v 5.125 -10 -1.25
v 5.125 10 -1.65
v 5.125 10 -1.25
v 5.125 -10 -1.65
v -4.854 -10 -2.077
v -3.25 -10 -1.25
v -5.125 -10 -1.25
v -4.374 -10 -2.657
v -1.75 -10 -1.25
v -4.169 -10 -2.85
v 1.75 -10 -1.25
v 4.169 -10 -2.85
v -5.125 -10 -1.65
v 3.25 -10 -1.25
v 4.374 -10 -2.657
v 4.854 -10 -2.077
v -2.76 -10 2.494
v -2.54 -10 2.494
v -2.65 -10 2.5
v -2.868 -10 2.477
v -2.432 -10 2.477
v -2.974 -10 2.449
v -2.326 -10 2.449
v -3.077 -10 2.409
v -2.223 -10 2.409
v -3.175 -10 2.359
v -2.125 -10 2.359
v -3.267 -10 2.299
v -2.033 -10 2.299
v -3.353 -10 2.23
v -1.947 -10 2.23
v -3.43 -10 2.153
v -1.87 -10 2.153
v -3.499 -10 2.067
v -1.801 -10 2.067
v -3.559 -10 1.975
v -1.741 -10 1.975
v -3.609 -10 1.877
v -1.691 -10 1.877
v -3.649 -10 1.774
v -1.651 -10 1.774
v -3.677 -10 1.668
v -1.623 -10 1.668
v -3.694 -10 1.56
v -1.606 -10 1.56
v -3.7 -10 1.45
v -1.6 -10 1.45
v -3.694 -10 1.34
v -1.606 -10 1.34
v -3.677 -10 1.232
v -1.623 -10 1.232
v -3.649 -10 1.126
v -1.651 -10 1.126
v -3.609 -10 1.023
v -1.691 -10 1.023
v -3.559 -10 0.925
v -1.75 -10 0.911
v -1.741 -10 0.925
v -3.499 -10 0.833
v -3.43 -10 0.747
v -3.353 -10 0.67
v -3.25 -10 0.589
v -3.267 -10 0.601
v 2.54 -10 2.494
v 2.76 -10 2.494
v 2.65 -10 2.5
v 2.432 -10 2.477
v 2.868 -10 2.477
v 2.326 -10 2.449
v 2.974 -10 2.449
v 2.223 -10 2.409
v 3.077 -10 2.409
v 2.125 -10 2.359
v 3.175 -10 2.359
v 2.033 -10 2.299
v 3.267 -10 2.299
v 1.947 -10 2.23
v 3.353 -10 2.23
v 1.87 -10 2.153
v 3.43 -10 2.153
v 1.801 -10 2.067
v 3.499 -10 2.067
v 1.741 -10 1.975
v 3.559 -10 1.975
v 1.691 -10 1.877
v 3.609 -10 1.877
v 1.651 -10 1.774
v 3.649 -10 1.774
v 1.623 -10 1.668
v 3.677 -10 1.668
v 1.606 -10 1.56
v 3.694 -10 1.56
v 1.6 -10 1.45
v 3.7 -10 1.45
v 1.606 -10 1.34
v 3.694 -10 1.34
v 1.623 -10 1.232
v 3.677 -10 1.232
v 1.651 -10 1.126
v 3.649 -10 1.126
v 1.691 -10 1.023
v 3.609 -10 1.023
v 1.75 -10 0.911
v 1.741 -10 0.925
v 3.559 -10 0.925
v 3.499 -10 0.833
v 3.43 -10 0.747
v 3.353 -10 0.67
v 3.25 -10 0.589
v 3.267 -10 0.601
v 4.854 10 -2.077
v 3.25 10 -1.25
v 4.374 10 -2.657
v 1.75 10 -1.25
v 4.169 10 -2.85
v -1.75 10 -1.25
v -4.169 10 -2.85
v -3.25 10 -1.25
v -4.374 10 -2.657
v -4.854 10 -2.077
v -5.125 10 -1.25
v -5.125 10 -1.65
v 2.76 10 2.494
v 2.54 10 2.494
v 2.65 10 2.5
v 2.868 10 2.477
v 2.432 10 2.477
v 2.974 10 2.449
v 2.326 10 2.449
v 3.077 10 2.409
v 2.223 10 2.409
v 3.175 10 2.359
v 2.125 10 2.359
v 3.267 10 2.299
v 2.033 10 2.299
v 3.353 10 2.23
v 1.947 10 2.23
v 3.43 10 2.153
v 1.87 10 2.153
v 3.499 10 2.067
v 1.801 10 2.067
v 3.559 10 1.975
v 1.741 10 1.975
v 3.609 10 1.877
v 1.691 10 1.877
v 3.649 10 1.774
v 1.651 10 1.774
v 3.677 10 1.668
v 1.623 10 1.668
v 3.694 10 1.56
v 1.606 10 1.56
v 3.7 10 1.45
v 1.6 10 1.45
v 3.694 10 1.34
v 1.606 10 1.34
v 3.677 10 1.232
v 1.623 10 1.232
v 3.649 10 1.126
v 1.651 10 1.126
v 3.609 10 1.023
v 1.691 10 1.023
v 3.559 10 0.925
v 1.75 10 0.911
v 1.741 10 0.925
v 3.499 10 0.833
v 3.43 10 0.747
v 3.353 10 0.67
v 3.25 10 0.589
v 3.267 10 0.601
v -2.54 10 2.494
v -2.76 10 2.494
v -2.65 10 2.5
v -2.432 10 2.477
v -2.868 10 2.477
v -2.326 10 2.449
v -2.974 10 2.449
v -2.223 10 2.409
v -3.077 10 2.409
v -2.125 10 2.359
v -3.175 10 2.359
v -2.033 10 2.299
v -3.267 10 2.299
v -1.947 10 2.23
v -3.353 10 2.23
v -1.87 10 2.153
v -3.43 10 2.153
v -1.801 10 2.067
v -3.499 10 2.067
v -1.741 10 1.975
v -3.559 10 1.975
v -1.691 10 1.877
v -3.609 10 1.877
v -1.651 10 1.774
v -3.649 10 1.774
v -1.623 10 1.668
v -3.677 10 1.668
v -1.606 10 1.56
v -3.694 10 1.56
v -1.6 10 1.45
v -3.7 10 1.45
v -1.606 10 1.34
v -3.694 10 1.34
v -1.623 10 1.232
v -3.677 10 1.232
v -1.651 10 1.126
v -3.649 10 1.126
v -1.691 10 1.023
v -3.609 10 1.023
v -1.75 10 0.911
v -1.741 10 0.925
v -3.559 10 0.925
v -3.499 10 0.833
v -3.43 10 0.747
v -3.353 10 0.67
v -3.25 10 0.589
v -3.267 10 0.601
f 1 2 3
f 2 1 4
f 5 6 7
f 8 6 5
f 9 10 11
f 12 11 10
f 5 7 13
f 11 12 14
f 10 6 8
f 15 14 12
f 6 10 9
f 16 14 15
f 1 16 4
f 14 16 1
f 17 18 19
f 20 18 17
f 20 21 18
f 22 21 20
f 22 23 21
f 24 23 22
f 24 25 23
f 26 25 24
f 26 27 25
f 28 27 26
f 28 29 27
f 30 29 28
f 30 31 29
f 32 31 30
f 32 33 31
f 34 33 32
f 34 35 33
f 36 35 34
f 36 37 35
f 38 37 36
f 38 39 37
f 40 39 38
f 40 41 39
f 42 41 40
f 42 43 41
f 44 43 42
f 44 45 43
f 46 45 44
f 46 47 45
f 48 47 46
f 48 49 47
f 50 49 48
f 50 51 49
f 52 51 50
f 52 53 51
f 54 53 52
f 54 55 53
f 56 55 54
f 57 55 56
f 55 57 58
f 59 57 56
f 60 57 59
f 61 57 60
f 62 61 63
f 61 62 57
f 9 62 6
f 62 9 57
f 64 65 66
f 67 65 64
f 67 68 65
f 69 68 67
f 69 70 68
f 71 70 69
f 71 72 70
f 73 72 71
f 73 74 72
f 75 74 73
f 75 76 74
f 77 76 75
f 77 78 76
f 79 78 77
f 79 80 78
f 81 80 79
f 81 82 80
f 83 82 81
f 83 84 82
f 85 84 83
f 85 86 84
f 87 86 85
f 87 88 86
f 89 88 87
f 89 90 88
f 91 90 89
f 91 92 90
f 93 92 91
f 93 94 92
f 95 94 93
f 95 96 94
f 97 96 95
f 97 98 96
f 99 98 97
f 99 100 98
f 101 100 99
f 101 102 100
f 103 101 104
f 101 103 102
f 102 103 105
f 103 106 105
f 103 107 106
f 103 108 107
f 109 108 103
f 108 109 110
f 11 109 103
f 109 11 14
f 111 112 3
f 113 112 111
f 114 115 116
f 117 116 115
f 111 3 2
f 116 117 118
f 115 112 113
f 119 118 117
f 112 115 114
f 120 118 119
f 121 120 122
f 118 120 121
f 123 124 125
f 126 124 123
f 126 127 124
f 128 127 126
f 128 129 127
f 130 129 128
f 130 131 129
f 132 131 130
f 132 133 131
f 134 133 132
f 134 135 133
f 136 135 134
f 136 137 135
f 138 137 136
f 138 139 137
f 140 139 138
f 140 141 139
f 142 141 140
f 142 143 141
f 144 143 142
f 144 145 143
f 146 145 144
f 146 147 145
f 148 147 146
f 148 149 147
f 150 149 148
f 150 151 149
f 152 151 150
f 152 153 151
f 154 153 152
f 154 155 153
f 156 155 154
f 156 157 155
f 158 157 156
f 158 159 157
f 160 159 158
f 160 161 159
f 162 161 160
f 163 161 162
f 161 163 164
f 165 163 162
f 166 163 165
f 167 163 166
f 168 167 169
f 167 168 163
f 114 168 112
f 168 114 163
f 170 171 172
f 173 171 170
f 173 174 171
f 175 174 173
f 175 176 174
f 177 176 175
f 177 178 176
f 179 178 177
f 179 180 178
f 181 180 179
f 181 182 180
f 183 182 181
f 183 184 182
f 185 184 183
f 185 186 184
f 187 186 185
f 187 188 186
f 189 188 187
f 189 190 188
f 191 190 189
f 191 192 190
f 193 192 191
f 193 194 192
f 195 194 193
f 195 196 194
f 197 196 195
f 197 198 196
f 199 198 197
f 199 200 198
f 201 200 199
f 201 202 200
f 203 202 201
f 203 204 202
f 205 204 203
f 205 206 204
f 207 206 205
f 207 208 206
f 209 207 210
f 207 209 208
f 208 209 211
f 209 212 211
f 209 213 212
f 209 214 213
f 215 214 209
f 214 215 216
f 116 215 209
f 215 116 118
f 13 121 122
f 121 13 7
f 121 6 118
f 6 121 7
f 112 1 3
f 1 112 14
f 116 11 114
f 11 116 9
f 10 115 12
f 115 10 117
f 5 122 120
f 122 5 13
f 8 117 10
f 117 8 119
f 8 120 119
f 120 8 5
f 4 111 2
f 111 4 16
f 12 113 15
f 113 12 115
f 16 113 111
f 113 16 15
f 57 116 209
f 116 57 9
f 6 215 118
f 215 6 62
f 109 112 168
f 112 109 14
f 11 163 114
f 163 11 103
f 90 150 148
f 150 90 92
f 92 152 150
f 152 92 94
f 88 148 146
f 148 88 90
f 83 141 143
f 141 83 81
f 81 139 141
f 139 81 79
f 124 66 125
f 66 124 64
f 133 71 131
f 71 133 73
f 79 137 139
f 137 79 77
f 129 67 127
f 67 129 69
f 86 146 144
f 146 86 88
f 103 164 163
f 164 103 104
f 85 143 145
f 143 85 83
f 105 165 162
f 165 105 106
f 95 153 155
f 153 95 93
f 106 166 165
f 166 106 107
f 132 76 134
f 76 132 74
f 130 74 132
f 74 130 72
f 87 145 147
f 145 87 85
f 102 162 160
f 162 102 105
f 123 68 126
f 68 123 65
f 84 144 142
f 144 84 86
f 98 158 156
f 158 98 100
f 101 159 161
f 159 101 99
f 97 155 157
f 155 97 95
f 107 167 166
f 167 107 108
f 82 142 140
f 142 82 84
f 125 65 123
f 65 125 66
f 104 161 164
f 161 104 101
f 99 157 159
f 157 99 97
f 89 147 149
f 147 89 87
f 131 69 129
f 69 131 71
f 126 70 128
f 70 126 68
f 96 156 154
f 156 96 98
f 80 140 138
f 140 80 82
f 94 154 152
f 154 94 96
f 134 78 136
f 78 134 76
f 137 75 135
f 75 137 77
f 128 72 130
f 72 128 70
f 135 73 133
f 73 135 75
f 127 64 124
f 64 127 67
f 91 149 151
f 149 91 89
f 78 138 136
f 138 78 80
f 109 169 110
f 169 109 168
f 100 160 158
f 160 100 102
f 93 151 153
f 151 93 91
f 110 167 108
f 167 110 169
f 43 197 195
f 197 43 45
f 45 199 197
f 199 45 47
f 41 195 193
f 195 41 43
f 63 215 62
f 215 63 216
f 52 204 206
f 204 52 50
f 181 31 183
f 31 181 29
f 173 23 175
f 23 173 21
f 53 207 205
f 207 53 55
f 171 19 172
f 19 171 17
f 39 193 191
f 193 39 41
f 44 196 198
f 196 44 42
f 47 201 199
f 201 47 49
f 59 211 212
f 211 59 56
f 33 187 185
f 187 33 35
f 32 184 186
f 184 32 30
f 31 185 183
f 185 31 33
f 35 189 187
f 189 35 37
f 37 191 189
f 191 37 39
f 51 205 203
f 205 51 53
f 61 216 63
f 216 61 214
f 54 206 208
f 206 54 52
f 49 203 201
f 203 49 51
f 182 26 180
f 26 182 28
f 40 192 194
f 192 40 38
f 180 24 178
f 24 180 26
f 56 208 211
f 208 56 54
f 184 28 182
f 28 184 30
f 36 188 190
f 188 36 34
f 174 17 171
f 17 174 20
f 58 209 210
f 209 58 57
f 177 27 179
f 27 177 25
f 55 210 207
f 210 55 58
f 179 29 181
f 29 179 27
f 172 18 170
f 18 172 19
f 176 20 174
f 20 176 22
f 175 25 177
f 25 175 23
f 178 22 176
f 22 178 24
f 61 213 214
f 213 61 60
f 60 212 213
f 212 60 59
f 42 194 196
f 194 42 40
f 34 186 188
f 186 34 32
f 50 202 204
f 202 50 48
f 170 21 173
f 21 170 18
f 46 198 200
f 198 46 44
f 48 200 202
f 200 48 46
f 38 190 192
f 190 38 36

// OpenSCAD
cover_length = 20; // the length of the cover

/* [Hidden] */
wing_width = 1.5;

module cover(cover_len)
{

	union() {

		translate([0, -2.2/2 - .95, 0])

			intersection() {
				cube([20.5/2, 1.6, cover_len], center=true);
				translate([0, 3.5, 0])
					cylinder(r=6, h=cover_len, $fn=50, center=true);
	
			}

		translate([-6.5/2 + wing_width/2,0,0])
			cube([wing_width,  2.75, cover_len], center=true);

		translate([6.5/2 - wing_width/2,0,0])
			cube([wing_width, 2.75, cover_len], center=true);

		translate([6.5/2 - wing_width/2 + 0.15, 2.2/2 + 0.35, 0])
			cylinder(r=1.05, h=cover_len, center=true, $fn=60);

		translate([-6.5/2 + wing_width/2 - 0.15, 2.2/2 + 0.35, 0])
			cylinder(r=1.05, h=cover_len, center=true, $fn=60);
	}
}

rotate([90, 0, 0])
	cover(cover_length);
